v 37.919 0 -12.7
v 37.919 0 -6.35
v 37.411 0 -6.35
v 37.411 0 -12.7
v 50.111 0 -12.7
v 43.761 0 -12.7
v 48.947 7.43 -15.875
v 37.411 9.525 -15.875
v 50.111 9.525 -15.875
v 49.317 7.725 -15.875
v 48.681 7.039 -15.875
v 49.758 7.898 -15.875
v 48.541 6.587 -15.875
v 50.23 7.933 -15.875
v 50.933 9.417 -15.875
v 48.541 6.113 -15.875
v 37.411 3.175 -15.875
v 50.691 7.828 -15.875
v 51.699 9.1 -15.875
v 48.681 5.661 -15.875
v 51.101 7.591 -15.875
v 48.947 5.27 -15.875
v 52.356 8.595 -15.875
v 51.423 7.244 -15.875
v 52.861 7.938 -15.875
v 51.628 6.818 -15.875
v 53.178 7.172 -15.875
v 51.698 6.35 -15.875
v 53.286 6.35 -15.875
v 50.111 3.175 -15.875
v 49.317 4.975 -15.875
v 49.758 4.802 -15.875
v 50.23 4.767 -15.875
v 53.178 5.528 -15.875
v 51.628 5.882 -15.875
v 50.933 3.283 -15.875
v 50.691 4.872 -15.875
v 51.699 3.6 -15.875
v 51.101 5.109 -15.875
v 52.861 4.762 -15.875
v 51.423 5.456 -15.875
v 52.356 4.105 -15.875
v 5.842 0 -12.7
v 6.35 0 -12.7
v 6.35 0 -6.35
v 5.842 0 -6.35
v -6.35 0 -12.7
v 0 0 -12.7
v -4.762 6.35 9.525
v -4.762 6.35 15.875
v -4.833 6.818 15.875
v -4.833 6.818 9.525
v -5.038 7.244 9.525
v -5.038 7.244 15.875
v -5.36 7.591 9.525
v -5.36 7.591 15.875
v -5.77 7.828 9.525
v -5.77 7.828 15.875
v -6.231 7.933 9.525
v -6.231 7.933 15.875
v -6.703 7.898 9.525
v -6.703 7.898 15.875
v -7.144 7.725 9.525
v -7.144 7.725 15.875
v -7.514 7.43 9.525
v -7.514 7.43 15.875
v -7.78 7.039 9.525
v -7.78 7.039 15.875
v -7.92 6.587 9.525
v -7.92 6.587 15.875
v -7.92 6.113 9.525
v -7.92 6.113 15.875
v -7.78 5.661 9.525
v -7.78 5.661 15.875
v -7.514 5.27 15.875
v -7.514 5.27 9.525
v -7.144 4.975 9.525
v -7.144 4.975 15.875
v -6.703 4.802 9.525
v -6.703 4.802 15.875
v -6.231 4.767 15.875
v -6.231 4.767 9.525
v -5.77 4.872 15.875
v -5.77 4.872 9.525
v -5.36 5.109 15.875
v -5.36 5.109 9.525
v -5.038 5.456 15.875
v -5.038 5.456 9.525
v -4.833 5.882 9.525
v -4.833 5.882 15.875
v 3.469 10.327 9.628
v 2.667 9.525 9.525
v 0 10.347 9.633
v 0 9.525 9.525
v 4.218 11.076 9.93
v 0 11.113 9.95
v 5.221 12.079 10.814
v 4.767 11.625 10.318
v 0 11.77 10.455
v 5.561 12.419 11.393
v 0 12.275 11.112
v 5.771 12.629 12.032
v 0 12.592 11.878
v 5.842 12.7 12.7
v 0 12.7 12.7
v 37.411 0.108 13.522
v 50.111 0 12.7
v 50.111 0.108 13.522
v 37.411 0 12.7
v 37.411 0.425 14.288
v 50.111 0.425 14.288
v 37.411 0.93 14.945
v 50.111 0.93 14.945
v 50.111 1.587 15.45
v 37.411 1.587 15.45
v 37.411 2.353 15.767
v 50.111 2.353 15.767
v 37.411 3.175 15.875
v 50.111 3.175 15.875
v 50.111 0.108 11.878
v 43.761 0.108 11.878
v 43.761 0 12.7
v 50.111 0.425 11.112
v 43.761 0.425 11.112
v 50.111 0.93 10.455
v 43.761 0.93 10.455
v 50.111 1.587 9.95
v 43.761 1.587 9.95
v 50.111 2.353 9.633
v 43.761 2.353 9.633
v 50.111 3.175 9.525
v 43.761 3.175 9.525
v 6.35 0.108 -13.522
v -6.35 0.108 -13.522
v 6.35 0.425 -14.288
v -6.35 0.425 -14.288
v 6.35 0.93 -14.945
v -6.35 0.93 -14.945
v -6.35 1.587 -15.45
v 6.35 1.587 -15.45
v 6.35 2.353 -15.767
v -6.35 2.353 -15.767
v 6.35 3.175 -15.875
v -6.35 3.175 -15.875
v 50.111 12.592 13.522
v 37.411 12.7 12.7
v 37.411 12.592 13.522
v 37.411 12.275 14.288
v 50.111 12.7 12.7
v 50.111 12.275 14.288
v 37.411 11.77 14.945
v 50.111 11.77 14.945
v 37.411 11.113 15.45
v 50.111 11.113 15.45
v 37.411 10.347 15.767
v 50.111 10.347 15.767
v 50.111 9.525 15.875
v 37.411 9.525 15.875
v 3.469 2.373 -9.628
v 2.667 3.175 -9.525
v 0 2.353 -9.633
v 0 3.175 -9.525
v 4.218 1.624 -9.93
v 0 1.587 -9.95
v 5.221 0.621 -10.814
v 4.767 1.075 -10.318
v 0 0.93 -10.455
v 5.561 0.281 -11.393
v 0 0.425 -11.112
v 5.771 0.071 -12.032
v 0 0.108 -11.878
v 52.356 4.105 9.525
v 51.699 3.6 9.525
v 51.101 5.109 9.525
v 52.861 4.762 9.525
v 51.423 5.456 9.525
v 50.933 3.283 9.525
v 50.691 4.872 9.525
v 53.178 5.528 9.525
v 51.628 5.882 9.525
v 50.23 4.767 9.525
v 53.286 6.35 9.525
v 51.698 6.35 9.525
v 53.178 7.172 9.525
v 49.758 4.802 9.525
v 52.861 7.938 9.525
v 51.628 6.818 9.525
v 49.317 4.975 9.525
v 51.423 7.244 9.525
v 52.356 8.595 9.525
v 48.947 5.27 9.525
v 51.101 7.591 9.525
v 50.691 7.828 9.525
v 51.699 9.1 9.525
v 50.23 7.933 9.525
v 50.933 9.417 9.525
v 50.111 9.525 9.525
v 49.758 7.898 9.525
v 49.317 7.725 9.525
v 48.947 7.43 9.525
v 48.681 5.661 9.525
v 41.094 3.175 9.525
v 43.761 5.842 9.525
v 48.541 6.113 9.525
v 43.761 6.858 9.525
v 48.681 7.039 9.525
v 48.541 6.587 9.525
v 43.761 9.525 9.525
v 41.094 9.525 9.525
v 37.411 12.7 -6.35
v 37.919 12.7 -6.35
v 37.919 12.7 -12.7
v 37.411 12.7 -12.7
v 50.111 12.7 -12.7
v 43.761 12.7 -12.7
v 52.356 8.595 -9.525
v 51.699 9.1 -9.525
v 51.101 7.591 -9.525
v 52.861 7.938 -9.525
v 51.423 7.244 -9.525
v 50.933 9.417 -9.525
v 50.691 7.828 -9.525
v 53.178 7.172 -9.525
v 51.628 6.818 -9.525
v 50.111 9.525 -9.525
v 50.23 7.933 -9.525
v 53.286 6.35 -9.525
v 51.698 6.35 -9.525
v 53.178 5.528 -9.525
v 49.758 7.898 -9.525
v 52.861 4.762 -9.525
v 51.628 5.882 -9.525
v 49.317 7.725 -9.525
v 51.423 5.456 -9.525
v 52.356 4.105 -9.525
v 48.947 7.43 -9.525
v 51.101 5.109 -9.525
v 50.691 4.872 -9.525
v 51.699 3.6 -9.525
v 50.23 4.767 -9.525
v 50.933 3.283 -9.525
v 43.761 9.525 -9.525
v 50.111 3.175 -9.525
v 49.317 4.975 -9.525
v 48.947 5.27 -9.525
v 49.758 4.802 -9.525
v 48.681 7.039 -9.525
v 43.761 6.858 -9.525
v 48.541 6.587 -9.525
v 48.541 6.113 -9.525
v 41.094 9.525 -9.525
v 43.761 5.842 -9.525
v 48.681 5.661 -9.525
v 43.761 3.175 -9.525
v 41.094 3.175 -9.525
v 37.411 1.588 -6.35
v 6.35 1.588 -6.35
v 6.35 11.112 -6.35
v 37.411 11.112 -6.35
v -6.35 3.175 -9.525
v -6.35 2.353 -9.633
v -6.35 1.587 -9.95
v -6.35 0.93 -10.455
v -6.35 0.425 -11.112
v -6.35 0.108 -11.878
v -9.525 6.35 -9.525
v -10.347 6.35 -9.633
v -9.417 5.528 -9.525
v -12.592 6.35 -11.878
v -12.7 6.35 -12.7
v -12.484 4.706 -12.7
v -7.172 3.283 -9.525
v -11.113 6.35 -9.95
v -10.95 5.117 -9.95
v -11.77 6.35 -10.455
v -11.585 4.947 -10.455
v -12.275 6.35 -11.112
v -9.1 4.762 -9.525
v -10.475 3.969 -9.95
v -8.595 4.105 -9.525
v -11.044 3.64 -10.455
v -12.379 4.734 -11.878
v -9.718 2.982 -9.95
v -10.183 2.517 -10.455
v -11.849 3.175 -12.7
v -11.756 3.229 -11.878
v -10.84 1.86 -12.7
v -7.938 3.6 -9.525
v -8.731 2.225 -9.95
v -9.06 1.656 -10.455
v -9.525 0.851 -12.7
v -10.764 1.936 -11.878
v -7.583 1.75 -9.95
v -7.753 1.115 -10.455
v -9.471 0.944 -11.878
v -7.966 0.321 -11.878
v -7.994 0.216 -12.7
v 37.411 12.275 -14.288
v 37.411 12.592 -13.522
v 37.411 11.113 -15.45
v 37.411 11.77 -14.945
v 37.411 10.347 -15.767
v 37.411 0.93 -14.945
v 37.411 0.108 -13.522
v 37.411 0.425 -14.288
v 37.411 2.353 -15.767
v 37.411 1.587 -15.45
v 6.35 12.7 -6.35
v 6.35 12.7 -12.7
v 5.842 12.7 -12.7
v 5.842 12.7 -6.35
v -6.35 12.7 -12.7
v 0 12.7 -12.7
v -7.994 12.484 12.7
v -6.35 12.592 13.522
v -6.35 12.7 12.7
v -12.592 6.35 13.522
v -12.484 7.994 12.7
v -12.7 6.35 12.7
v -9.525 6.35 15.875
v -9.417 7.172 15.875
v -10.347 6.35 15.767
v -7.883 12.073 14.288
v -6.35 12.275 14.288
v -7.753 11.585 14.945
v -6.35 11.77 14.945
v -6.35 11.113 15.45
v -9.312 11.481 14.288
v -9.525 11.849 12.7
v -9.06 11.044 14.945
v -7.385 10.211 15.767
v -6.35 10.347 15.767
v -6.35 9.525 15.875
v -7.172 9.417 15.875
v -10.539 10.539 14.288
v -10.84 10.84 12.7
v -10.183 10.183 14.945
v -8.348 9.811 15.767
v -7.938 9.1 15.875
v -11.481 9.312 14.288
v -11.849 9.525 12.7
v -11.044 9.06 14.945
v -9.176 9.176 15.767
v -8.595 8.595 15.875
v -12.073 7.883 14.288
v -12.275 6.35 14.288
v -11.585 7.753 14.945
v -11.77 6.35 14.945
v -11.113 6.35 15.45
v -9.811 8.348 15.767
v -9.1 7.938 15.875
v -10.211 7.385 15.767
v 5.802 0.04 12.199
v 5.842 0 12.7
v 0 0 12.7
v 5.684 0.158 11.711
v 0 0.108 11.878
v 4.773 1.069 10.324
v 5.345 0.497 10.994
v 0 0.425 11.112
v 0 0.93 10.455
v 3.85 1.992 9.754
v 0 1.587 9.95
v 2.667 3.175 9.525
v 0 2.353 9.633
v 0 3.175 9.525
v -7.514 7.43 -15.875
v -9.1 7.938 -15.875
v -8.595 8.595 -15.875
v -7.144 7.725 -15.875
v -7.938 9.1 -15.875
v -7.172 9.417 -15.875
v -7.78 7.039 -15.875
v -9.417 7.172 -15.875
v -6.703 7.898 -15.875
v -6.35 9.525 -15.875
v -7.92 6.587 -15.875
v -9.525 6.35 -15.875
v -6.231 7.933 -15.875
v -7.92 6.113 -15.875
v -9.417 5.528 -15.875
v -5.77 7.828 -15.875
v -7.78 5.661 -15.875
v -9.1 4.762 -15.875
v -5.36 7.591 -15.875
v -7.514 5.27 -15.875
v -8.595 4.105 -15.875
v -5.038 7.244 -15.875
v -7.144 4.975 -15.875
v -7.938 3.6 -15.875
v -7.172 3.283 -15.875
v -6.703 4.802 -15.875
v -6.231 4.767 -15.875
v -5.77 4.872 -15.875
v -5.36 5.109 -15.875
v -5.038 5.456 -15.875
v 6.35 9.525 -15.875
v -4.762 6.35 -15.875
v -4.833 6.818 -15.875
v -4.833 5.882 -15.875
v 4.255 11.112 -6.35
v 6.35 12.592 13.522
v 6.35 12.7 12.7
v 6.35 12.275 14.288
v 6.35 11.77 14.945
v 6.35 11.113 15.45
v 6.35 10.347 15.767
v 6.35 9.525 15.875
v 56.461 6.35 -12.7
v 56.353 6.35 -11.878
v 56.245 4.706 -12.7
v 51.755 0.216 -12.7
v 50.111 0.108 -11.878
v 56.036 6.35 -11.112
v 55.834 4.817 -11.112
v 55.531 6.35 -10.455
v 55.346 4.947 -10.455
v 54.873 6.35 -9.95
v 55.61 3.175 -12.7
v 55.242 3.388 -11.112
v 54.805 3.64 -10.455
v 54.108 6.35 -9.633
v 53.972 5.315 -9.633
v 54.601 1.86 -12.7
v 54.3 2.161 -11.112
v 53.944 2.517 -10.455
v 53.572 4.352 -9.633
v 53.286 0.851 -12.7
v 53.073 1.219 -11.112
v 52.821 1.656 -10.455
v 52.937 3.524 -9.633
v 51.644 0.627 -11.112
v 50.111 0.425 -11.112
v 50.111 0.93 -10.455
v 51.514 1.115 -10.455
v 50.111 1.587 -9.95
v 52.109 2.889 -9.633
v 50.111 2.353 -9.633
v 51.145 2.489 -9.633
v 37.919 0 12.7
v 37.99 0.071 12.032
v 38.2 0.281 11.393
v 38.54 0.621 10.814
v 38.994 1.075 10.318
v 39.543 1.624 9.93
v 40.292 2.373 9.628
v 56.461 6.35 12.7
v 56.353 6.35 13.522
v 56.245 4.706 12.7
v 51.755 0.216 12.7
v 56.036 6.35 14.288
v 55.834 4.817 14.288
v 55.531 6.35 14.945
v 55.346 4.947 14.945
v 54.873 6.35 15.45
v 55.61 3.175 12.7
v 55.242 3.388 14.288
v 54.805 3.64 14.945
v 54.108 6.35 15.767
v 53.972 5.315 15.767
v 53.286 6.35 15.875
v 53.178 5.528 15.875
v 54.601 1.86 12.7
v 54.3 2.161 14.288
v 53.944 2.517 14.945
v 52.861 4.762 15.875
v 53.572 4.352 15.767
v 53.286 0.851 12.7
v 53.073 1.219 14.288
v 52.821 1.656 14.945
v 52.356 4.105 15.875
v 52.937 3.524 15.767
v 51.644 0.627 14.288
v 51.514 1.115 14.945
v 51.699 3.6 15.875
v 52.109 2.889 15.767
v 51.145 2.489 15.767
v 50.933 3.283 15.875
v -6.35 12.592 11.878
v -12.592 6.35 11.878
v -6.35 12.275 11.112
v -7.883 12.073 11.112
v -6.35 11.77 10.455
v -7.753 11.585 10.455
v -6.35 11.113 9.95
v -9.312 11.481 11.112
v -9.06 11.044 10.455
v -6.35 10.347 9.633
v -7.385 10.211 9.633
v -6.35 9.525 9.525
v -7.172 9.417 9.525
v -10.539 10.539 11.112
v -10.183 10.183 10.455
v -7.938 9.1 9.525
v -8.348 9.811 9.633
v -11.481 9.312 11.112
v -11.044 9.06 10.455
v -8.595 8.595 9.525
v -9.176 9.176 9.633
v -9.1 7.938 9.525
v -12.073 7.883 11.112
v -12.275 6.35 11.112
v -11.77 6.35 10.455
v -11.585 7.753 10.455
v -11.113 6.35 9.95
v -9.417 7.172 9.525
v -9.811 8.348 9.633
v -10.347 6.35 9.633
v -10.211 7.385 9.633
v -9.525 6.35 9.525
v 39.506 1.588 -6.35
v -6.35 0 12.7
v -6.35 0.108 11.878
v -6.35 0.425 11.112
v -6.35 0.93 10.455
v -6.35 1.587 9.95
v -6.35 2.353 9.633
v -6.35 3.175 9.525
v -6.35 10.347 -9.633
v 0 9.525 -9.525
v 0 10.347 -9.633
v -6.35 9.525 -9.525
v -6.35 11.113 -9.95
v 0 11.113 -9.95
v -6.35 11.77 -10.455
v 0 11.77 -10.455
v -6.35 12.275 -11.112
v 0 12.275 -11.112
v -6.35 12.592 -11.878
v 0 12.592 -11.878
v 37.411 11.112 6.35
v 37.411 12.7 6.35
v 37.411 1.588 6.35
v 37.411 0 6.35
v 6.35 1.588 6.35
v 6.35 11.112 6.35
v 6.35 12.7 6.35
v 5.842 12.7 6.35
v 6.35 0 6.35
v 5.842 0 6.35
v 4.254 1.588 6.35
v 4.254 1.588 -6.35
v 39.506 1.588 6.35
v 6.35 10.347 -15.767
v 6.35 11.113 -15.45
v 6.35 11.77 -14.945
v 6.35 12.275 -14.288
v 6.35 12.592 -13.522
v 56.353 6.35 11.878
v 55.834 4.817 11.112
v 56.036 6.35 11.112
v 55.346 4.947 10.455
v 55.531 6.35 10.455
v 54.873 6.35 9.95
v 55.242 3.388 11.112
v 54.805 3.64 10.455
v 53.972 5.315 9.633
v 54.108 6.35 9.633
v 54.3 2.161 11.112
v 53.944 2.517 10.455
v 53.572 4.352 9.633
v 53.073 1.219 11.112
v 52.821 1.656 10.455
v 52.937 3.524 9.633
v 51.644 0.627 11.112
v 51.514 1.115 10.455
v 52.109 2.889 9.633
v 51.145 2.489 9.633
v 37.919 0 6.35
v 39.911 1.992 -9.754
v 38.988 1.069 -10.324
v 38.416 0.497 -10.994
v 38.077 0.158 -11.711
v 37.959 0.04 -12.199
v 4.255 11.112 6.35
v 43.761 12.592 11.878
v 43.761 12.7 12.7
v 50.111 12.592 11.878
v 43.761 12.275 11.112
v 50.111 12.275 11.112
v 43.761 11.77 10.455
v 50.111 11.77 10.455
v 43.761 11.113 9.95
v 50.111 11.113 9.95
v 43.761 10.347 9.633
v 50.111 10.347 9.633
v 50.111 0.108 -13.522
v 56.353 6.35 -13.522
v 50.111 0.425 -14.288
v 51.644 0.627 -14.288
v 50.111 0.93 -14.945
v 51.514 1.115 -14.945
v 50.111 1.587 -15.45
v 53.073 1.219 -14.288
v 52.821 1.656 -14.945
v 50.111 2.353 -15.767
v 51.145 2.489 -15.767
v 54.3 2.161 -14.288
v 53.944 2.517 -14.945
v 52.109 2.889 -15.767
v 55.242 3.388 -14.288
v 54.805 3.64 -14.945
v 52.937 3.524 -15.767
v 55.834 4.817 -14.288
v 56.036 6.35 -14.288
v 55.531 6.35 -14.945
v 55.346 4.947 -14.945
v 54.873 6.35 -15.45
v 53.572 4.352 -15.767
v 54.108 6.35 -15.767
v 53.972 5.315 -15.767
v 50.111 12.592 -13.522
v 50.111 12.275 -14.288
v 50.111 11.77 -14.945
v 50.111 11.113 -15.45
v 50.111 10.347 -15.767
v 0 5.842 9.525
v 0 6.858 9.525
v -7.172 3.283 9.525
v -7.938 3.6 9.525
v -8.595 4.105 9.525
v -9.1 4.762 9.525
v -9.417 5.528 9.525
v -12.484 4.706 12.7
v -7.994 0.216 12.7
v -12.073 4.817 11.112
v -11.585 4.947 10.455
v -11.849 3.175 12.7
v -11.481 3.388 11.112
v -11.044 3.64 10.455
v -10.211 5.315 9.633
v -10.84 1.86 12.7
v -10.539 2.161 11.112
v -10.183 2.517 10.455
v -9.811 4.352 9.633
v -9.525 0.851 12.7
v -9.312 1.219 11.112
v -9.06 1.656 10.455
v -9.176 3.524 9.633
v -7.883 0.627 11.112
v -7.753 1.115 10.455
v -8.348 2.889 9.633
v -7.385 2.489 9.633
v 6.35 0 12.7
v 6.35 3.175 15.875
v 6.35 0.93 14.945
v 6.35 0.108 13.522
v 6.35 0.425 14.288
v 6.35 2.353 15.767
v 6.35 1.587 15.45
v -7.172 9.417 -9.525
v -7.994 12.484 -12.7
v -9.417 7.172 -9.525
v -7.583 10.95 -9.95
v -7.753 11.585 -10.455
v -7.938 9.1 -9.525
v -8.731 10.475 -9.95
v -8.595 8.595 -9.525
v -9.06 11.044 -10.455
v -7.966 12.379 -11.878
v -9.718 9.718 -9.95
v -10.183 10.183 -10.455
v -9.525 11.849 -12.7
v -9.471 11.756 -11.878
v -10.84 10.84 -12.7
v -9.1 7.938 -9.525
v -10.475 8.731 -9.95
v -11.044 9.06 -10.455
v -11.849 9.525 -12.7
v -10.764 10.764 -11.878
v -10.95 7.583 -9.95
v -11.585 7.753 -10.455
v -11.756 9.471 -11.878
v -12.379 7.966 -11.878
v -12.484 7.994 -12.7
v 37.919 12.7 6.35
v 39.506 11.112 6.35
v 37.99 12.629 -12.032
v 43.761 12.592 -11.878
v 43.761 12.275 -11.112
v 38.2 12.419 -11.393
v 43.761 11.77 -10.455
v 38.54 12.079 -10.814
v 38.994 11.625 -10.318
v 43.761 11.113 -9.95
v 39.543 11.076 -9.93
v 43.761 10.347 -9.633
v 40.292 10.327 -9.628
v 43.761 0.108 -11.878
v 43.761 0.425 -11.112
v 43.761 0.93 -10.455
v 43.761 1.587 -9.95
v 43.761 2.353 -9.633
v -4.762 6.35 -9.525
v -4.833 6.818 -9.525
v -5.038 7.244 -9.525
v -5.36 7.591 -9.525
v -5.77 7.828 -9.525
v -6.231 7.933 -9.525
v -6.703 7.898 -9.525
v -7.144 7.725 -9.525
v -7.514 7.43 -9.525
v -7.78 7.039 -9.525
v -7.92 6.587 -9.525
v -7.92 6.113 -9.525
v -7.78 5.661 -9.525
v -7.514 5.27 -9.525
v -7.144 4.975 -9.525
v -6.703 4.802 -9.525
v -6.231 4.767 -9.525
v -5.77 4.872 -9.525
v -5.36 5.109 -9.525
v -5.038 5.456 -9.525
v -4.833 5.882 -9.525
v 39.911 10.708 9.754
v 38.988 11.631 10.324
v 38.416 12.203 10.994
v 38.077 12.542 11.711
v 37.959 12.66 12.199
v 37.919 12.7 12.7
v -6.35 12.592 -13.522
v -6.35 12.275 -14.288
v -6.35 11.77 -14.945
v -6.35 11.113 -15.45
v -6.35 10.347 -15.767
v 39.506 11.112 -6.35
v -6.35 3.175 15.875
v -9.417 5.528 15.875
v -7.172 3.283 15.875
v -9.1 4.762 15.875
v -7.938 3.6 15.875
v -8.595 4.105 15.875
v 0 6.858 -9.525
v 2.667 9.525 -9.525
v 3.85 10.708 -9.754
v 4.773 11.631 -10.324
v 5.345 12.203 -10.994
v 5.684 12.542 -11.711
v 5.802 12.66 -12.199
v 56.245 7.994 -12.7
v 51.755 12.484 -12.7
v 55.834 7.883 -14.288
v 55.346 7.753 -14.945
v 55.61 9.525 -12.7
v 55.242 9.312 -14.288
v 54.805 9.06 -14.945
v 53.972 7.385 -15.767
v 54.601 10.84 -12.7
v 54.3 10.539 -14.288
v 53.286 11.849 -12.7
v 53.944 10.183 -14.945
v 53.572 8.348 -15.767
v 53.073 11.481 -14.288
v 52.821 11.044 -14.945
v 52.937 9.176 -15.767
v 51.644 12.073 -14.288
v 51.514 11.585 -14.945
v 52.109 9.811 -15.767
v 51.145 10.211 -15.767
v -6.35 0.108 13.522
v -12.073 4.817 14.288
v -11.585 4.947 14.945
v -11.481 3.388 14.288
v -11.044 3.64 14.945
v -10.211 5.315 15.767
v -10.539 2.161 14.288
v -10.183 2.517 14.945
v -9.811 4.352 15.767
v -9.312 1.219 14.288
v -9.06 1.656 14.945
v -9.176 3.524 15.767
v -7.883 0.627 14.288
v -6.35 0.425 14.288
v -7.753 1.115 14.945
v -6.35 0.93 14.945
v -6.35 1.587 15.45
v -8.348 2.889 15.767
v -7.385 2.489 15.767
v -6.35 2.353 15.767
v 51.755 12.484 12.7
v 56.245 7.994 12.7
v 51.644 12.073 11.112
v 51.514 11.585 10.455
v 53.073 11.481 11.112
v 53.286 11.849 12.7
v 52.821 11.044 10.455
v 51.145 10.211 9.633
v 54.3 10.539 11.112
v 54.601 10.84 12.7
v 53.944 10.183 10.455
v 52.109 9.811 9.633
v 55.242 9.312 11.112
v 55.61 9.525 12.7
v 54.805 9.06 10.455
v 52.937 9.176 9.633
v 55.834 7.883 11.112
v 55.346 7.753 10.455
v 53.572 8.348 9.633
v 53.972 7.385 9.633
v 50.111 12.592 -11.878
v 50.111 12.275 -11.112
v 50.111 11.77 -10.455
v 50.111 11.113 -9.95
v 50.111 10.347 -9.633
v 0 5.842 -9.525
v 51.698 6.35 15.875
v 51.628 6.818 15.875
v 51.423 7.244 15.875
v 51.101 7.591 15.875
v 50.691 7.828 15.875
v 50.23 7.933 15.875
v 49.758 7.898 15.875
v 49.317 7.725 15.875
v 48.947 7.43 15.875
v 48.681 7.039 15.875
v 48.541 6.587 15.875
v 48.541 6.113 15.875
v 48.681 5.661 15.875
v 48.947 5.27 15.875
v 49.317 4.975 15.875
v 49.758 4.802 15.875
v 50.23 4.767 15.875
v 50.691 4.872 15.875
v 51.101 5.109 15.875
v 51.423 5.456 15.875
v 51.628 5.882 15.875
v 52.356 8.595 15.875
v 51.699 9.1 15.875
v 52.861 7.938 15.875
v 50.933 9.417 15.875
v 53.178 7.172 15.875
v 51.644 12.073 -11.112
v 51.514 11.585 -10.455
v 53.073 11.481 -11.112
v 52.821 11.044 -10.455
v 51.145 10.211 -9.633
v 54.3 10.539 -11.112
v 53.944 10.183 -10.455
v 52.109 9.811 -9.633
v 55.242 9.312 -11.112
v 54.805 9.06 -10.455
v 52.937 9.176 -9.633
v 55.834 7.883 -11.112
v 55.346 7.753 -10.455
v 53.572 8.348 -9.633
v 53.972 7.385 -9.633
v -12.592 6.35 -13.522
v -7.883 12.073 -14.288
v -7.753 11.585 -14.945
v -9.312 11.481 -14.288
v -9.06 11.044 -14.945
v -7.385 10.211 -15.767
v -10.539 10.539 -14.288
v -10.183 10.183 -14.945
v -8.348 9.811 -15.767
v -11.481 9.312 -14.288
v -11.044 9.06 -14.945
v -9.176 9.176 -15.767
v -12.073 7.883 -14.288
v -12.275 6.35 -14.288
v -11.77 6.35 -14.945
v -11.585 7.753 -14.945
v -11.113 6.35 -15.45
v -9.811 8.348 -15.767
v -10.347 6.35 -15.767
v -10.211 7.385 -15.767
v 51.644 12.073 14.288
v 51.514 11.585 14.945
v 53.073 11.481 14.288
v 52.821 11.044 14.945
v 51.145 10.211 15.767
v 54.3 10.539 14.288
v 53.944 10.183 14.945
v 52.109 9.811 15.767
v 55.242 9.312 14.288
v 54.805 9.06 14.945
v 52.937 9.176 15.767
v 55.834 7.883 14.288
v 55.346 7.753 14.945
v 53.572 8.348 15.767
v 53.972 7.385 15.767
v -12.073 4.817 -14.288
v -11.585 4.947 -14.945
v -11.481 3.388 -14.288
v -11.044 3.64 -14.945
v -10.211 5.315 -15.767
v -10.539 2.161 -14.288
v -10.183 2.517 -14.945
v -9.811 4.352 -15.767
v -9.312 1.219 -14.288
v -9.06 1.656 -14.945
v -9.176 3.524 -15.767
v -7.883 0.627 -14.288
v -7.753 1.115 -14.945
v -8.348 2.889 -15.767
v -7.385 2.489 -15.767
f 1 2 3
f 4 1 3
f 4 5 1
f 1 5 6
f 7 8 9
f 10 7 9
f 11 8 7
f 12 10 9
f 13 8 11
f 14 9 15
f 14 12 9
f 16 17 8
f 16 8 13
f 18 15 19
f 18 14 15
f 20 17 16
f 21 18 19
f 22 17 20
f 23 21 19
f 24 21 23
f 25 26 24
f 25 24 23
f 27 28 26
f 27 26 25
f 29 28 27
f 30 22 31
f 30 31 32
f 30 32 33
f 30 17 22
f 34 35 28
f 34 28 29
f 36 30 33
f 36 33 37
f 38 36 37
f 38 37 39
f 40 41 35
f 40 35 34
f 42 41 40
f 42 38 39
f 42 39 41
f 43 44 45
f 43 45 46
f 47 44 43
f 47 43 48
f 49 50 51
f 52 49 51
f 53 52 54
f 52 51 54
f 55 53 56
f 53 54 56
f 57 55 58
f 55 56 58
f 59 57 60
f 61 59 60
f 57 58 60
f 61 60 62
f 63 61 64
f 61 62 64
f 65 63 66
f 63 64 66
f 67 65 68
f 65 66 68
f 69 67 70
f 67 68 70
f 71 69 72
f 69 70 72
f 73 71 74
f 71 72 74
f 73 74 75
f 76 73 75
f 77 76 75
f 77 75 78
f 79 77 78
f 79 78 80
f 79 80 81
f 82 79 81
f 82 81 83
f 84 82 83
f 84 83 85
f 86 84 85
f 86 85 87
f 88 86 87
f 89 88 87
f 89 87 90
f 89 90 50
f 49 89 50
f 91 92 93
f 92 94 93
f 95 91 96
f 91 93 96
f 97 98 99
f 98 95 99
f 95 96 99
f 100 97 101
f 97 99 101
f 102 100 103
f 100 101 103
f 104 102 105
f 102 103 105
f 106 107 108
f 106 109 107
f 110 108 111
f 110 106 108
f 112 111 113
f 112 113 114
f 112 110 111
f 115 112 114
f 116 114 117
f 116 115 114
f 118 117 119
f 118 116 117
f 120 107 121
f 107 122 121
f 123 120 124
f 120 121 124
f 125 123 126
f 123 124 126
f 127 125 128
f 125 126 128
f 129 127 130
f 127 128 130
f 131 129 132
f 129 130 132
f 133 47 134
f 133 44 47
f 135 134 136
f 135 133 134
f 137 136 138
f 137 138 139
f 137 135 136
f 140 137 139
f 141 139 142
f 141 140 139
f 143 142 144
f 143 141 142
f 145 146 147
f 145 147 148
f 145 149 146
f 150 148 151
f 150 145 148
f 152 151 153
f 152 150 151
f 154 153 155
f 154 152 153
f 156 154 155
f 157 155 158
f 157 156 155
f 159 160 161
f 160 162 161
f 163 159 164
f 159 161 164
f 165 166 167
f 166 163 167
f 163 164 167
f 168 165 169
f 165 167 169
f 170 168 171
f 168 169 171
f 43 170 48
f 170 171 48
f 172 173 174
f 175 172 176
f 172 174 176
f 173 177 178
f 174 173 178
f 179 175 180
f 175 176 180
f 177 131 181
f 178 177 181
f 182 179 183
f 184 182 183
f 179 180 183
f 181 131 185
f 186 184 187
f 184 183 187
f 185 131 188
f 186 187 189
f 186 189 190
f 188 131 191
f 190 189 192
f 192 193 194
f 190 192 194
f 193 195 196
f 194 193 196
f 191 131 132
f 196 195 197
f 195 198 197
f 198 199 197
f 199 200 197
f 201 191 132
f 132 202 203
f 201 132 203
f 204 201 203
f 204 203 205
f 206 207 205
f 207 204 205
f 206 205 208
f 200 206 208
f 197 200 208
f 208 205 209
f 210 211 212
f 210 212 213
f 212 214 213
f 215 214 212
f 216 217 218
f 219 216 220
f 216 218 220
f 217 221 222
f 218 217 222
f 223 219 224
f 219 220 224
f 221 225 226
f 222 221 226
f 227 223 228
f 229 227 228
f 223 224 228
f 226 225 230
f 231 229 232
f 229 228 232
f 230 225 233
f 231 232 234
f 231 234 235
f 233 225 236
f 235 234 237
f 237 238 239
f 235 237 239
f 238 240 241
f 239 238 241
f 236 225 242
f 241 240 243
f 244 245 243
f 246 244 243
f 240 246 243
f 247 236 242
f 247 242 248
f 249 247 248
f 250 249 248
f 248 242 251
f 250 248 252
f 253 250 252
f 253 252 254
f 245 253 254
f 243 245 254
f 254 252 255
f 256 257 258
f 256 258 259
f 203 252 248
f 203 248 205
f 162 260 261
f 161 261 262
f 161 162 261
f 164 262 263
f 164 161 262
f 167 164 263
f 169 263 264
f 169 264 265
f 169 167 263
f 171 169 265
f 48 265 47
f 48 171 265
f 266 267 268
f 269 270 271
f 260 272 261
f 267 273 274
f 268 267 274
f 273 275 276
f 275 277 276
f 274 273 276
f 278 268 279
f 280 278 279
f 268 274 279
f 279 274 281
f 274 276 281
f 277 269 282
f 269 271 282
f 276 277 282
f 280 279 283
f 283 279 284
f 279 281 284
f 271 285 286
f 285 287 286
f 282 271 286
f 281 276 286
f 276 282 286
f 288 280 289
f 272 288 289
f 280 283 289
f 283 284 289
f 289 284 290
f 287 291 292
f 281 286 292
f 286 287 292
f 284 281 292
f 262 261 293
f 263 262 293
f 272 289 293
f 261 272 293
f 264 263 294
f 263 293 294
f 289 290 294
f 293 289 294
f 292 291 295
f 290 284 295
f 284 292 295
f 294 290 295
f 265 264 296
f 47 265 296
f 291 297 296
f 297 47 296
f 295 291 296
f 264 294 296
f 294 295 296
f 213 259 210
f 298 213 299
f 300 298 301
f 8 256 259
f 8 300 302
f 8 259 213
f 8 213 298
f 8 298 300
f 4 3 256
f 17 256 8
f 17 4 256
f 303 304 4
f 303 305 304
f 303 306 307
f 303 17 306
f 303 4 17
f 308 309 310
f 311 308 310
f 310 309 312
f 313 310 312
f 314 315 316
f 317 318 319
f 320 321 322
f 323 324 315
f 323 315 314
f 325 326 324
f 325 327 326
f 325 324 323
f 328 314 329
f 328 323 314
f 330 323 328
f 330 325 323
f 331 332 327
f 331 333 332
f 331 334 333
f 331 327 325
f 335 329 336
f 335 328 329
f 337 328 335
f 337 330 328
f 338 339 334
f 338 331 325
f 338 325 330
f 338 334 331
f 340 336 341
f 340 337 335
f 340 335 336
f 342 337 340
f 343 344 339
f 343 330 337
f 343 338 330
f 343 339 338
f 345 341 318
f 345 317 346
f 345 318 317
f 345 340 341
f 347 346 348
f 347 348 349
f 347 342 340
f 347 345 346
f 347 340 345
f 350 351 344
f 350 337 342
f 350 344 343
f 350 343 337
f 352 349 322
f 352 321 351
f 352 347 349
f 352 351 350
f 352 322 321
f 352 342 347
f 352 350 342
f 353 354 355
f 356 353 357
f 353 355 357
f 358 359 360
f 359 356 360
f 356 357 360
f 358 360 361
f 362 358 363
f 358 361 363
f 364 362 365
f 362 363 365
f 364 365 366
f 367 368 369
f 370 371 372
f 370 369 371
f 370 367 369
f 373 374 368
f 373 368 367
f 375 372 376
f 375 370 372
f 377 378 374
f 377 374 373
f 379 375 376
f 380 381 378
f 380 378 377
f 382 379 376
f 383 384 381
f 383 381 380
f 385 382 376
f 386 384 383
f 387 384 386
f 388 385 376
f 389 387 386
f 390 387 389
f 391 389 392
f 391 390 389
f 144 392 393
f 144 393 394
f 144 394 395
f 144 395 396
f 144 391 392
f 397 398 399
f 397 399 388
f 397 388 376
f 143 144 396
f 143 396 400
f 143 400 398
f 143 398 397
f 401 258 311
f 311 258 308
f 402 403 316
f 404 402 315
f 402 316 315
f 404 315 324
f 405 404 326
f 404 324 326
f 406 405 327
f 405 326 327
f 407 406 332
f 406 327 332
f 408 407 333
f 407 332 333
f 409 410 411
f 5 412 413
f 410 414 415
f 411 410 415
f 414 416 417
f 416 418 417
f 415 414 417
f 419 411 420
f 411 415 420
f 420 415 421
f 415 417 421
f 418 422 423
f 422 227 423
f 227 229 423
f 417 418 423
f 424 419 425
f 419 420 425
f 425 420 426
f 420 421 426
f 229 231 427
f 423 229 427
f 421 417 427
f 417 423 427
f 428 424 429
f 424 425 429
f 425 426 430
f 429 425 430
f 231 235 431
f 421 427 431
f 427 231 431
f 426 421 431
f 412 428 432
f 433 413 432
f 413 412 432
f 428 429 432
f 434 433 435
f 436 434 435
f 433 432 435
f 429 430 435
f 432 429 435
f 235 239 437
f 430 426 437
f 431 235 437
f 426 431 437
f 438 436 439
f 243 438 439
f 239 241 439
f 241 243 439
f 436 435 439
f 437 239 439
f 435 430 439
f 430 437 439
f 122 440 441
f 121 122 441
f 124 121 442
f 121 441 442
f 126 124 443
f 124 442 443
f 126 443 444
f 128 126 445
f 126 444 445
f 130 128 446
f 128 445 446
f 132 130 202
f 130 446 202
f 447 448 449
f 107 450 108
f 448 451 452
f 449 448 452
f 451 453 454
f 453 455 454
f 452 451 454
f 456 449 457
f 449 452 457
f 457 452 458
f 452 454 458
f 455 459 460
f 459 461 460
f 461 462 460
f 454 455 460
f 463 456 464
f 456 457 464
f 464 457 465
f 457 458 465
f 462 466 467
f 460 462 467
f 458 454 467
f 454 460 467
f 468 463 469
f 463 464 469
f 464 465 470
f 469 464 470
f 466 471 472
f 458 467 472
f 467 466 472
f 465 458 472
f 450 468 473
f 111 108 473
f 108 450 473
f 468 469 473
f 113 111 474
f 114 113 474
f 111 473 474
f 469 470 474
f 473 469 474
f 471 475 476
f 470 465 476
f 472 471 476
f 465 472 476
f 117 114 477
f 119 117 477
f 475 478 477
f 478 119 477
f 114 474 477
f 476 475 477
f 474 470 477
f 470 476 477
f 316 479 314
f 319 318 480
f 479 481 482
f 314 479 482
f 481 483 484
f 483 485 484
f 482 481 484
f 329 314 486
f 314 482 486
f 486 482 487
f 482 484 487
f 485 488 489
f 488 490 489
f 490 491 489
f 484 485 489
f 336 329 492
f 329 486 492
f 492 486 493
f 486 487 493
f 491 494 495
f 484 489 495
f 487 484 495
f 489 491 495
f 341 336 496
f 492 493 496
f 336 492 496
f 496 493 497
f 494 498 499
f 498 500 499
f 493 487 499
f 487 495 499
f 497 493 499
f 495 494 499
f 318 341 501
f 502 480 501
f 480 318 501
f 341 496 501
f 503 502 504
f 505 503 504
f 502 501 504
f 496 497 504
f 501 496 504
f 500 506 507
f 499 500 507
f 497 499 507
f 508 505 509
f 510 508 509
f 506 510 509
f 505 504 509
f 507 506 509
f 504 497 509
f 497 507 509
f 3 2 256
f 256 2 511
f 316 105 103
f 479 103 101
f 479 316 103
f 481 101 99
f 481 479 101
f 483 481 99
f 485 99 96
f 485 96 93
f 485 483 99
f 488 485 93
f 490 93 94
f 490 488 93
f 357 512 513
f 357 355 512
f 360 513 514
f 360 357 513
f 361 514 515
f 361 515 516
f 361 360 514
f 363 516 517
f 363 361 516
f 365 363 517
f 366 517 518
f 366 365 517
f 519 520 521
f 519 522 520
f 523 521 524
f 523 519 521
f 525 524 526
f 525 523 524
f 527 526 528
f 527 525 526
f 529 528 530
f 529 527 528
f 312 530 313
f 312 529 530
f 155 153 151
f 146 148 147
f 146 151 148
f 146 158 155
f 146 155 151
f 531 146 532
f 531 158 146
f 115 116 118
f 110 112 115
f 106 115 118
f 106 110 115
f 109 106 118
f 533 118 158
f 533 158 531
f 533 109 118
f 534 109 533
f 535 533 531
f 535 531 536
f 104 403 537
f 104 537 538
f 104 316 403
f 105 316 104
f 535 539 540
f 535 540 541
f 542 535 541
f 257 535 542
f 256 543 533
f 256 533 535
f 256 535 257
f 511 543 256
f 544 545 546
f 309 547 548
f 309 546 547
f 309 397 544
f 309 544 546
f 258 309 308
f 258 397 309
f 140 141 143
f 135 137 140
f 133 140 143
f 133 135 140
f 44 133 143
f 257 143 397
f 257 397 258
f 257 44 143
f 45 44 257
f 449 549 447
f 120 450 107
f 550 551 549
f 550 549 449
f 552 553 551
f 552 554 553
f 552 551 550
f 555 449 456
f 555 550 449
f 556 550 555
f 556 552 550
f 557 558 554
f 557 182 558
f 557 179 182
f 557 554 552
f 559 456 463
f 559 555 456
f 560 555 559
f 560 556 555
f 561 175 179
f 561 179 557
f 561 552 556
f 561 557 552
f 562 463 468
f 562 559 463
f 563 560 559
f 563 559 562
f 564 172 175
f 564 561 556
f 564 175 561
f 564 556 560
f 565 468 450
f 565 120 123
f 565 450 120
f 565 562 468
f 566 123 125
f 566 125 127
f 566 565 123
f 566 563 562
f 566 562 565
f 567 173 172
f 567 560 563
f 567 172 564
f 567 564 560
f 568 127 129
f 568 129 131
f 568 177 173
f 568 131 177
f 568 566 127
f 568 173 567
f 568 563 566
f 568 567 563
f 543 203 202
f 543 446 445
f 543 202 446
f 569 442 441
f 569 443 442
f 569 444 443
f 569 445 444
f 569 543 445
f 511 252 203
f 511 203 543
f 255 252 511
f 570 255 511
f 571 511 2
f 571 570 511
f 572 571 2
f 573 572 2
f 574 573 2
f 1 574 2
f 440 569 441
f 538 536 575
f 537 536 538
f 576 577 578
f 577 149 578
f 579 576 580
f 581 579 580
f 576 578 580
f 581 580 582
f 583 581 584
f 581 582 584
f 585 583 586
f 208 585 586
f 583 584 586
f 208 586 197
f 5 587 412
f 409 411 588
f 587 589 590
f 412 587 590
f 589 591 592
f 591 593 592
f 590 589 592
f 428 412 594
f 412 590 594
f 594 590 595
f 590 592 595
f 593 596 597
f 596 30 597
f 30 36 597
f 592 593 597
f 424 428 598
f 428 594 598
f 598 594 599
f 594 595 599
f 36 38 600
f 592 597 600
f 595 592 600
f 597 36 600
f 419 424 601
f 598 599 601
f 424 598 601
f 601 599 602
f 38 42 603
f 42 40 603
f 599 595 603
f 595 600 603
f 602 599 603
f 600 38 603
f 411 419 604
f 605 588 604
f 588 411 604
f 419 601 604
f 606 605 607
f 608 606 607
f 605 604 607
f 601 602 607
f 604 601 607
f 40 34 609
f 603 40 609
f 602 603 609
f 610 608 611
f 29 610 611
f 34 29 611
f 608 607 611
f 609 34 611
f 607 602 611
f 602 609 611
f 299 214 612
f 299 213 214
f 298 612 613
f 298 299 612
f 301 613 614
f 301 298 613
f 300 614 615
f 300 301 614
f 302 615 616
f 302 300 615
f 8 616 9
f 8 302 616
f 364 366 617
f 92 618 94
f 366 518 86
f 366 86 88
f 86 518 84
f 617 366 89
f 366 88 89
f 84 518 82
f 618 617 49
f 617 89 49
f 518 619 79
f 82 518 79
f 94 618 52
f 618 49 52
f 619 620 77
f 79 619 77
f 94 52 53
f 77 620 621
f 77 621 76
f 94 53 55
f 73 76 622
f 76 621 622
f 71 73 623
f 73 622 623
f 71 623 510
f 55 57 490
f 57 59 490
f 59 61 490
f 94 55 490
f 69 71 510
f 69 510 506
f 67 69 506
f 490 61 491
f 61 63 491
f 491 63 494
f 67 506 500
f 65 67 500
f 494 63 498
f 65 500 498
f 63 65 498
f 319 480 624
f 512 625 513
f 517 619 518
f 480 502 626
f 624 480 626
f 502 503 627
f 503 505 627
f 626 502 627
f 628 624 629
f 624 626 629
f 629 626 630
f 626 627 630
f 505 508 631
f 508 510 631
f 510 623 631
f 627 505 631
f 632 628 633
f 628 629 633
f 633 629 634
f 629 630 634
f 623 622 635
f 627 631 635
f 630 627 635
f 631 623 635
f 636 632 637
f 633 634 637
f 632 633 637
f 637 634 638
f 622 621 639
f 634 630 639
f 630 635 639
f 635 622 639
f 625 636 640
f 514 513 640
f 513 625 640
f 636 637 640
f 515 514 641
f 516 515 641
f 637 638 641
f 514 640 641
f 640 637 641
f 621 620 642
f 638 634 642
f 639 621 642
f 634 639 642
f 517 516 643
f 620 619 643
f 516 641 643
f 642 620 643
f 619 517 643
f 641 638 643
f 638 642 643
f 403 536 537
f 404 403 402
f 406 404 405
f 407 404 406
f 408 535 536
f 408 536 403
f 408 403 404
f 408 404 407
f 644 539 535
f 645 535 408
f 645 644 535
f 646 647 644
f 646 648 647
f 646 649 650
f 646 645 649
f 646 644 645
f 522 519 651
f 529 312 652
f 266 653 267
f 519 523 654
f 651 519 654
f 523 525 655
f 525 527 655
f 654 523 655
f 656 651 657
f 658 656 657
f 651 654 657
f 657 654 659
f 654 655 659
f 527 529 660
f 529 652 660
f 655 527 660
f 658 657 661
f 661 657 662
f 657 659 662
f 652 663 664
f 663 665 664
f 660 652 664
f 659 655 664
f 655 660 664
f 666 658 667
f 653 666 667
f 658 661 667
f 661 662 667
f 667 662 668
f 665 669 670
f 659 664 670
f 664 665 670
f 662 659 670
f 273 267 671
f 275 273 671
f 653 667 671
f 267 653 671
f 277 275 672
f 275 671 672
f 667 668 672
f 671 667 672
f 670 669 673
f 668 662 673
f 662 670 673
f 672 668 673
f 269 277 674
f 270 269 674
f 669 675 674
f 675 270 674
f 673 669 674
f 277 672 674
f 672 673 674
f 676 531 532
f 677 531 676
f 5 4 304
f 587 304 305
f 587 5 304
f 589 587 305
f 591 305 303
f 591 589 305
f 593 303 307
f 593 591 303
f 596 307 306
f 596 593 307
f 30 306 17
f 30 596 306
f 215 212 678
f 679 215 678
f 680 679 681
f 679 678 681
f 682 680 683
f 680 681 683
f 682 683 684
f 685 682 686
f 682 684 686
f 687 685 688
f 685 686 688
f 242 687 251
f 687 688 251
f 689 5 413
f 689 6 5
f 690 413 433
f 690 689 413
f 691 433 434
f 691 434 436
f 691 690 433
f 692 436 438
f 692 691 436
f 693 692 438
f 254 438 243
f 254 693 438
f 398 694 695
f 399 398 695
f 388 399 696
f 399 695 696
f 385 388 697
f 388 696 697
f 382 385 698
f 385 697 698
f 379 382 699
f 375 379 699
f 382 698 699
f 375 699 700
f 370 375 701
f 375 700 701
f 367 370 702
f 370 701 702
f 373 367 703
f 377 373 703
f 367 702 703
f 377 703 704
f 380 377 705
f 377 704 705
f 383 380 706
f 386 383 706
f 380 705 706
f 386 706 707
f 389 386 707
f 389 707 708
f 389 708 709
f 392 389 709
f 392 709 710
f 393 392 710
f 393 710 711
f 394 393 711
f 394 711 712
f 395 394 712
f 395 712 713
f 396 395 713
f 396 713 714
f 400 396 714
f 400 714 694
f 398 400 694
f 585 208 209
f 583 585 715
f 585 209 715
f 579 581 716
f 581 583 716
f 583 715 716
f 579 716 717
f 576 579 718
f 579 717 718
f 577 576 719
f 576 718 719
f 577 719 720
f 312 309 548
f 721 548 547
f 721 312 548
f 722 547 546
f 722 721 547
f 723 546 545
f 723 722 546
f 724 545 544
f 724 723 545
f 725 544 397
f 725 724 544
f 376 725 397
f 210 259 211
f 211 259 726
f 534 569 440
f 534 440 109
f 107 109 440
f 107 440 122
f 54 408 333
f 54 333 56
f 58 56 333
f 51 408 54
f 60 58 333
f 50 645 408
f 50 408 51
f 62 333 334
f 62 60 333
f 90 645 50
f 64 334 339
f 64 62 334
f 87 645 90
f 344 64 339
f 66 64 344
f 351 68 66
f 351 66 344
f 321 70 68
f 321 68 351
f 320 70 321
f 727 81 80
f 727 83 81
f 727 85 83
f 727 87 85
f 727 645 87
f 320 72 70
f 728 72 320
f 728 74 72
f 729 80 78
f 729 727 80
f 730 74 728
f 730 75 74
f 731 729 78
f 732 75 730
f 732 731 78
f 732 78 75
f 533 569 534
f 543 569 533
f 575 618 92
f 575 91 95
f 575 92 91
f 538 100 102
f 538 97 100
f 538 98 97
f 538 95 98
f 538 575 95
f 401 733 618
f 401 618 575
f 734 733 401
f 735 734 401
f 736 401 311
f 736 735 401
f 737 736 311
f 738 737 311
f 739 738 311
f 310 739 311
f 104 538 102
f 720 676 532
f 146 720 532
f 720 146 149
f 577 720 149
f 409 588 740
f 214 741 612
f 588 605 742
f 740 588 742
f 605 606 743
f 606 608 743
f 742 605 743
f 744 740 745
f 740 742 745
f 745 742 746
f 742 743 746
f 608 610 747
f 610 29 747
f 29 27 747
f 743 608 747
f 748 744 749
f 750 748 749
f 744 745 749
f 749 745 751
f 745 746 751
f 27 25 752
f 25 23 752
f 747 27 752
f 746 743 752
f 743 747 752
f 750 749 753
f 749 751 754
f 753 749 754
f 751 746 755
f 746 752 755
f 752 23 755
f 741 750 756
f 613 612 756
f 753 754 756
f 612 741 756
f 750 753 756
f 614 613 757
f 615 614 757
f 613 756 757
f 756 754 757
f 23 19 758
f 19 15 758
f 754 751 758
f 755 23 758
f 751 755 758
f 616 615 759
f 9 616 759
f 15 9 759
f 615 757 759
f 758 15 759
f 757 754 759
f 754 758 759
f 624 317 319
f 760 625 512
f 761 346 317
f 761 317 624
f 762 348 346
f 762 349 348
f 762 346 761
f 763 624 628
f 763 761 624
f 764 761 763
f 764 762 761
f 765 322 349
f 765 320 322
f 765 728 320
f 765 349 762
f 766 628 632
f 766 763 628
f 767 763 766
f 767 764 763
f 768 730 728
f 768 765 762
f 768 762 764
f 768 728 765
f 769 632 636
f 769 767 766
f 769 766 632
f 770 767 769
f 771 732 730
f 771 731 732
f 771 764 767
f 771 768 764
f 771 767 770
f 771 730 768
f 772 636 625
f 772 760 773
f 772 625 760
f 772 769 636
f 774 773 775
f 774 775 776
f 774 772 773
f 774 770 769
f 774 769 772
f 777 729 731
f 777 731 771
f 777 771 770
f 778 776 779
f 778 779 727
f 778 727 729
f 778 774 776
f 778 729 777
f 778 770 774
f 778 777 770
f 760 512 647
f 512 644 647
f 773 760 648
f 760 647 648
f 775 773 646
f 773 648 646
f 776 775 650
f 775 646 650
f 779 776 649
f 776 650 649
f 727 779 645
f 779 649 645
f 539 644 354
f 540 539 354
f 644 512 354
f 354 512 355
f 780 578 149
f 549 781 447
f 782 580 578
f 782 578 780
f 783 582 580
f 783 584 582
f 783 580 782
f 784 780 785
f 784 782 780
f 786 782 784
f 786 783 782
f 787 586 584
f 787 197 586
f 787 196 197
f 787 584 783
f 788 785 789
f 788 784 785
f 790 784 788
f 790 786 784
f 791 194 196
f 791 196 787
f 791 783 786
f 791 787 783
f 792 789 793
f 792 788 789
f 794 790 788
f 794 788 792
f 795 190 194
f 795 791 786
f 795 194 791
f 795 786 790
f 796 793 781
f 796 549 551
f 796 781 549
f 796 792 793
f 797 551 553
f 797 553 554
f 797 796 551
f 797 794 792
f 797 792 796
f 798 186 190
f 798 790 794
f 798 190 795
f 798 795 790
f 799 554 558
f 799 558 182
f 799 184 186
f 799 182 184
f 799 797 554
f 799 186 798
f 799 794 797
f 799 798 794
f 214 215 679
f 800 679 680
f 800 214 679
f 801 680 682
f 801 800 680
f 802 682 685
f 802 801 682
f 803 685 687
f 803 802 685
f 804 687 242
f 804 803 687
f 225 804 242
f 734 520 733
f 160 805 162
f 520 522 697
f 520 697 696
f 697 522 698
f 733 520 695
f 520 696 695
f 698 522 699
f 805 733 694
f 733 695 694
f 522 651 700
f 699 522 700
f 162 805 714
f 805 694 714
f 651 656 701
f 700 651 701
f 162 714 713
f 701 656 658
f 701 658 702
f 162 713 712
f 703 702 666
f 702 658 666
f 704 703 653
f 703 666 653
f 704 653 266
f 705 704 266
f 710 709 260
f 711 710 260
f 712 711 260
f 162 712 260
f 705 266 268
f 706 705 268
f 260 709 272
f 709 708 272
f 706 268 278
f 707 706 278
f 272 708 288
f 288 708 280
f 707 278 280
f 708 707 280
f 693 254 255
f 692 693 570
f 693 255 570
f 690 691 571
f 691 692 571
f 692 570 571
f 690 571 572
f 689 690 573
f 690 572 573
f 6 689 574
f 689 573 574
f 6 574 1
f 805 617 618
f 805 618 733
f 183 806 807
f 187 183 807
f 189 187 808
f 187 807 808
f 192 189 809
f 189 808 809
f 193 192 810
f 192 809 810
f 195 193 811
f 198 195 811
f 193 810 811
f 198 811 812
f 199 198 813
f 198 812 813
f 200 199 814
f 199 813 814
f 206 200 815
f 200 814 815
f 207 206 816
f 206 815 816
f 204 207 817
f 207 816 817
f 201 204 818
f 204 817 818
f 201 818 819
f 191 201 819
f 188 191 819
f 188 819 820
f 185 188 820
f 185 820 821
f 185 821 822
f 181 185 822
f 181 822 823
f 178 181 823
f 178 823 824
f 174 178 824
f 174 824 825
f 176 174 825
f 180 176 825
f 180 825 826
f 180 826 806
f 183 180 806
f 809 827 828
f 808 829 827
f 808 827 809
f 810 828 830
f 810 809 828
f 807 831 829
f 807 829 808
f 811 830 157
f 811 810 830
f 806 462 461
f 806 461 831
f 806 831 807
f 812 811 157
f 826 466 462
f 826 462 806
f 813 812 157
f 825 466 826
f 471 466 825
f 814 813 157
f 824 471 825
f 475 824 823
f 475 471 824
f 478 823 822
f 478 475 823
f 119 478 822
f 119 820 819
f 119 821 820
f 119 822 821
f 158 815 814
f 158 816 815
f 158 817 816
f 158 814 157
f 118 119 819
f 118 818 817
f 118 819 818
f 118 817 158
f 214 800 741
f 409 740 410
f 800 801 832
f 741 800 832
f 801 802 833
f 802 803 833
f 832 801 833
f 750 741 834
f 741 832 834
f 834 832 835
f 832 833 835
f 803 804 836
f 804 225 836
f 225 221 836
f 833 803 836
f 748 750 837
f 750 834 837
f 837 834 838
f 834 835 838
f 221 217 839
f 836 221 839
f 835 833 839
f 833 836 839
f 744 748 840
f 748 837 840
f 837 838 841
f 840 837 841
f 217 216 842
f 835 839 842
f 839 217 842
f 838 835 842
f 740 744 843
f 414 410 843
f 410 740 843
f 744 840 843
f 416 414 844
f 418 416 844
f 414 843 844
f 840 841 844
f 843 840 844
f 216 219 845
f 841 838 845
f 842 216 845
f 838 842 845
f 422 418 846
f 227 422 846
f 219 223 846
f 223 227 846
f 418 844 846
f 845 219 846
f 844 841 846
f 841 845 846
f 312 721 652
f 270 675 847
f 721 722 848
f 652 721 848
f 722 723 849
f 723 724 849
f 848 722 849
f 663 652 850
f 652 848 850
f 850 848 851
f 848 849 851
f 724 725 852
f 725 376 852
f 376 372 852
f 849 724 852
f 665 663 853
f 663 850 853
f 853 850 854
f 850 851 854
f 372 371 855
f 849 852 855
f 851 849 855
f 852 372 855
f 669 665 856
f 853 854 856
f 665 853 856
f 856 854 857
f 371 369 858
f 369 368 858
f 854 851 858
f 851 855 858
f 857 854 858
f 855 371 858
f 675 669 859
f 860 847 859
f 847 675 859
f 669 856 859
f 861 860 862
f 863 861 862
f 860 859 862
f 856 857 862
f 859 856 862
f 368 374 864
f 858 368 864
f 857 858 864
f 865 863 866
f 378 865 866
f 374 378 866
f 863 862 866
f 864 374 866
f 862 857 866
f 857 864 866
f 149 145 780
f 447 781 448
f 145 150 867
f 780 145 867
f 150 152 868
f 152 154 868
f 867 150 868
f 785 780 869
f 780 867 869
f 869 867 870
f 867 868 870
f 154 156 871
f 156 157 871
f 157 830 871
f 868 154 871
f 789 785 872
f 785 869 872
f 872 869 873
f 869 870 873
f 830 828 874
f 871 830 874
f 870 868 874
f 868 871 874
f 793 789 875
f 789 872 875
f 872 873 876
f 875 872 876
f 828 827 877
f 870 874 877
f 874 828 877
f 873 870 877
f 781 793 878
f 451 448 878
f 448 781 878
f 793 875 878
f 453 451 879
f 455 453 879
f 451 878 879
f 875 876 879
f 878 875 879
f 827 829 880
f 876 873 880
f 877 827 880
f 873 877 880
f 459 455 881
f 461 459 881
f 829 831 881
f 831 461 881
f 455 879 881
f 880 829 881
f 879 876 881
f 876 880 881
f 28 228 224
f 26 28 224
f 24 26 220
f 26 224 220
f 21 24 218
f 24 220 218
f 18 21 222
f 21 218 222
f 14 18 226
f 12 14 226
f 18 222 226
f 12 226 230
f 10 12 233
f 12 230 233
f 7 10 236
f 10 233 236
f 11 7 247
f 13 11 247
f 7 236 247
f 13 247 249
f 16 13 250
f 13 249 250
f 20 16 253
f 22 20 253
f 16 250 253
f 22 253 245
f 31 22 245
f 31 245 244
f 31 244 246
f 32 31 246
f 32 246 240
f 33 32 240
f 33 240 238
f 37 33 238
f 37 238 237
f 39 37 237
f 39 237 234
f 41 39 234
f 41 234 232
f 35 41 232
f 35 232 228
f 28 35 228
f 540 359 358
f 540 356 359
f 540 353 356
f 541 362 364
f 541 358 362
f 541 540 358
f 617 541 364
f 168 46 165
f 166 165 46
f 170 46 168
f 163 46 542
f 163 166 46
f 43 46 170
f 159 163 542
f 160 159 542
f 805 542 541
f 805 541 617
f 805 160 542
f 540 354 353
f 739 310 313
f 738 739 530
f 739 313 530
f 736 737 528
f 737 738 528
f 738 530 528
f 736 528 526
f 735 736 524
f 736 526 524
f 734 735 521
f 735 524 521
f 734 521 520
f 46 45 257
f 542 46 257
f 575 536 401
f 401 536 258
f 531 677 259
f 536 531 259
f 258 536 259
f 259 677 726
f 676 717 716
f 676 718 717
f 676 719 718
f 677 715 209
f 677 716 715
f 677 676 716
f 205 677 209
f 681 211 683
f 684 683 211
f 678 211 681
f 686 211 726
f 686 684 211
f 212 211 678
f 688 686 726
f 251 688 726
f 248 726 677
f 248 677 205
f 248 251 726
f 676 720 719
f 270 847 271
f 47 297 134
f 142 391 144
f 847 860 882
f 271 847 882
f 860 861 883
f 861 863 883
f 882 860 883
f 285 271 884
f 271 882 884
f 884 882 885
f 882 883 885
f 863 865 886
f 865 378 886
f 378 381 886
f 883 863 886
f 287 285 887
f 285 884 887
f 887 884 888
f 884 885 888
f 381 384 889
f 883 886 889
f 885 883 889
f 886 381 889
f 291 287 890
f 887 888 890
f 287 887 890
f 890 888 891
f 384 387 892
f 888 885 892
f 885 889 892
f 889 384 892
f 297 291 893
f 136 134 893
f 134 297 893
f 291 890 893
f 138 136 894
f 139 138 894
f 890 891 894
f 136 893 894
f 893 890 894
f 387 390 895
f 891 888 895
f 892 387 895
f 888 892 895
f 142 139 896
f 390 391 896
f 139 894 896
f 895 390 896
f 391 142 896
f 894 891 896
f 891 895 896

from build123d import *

# Parameters (mm, degrees)
BOSS_EXTRUDE1_DEPTH = 12.7
SKETCH2_R           = 1.5875
CUT_EXTRUDE1_DEPTH  = 67.009021317
FILLET5_R           = 6.35
FILLET6_R           = 3.175
CHAMFER1_START      = -12.7
CHAMFER1_DEPTH      = 25.4
CHAMFER1_2_DEPTH    = 5.842
CHAMFER1_START_2    = 37.918945752
CHAMFER1_3_DEPTH    = 5.842
CUT_EXTRUDE2_REACH  = 62.01
SKETCH4_W           = 12.7
SKETCH4_H           = 1.5875


with BuildPart() as part:
    # Sketch1 → Boss-Extrude1 (new body)
    with BuildSketch(Plane(origin=(0, 0, 0), x_dir=(1, 0, 0), z_dir=(0, 1, 0))):
        Polygon((0, 9.525), (-12.7, 9.525), (-12.7, 15.875), (6.35, 15.875), (6.35, 6.35), (37.410945752, 6.35), (37.410945752, 15.875), (56.460945752, 15.875), (56.460945752, 9.525), (43.760945752, 9.525), (43.760945752, -9.525), (56.460945752, -9.525), (56.460945752, -15.875), (37.410945752, -15.875), (37.410945752, -6.35), (6.35, -6.35), (6.35, -15.875), (-12.7, -15.875), (-12.7, -9.525), (0, -9.525), align=None)
    extrude(amount=BOSS_EXTRUDE1_DEPTH)

    # Sketch2 → Cut-Extrude1 (cut, through all)
    with BuildSketch(Plane.XY.offset(15.875)):
        with Locations((50.110945752, 6.35)):
            Circle(SKETCH2_R)
        with Locations((-6.35, 6.35)):
            Circle(SKETCH2_R)
    extrude(amount=-CUT_EXTRUDE1_DEPTH, mode=Mode.SUBTRACT)

    # Fillet5
    fillet5_edges = [part.edges().sort_by_distance(p)[0] for p in [
        (56.460945752, 0, 12.7),
        (56.460945752, 12.7, 12.7),
        (56.460945752, 0, -12.7),
        (56.460945752, 12.7, -12.7),
        (-12.7, 12.7, 12.7),
        (-12.7, 0, 12.7),
        (-12.7, 0, -12.7),
        (-12.7, 12.7, -12.7),
    ]]
    fillet(fillet5_edges, radius=FILLET5_R - 0.0001)  # a hair under: the kernel refuses the full size

    # Fillet6
    fillet6_edges = [part.edges().sort_by_distance(p)[0] for p in [
        (43.760995752, 0, 15.875),
        (54.601103102, 1.85984265, 15.875),
        (54.601103102, 10.84015735, 15.875),
        (43.760995752, 0, -15.875),
        (54.601103102, 1.85984265, -15.875),
        (54.601103102, 10.84015735, -15.875),
        (-5e-05, 0, -15.875),
        (-10.84015735, 1.85984265, -15.875),
        (-10.84015735, 10.84015735, -15.875),
        (-5e-05, 12.7, 15.875),
        (-5e-05, 0, 15.875),
        (-10.84015735, 1.85984265, 15.875),
        (-3.17505, 12.7, -9.525),
        (-3.17505, 0, -9.525),
        (-10.84015735, 1.85984265, -9.525),
        (-3.17505, 0, 9.525),
        (-10.84015735, 1.85984265, 9.525),
        (-3.17505, 12.7, 9.525),
        (46.935995752, 0, -9.525),
        (54.601103102, 1.85984265, -9.525),
        (46.935995752, 12.7, -9.525),
        (46.935995752, 12.7, 9.525),
        (46.935995752, 0, 9.525),
        (54.601103102, 1.85984265, 9.525),
        (43.760995752, 12.7, 15.875),
        (43.760995752, 12.7, -15.875),
        (-5e-05, 12.7, -15.875),
        (-10.84015735, 10.84015735, 15.875),
        (-10.84015735, 10.84015735, -9.525),
        (-10.84015735, 10.84015735, 9.525),
        (54.601103102, 10.84015735, -9.525),
        (54.601103102, 10.84015735, 9.525),
    ]]
    fillet(fillet6_edges, radius=FILLET6_R - 0.0001)  # a hair under: the kernel refuses the full size

    # Chamfer1: read off the stored shape, not the designer's step
    # Chamfer1 outline → Chamfer1 (cut)
    with BuildSketch(Plane.XY.offset(CHAMFER1_START)):
        Polygon((43.760945752, 5.842), (37.918945752, 0), (43.760945752, 0), align=None)
        Polygon((0, 0), (5.842, 0), (0, 5.842), align=None)
        Polygon((37.918945752, 12.7), (43.760945752, 6.858), (43.760945752, 12.7), align=None)
        Polygon((0, 12.7), (0, 6.858), (5.842, 12.7), align=None)
    extrude(amount=CHAMFER1_DEPTH, mode=Mode.SUBTRACT)

    # Chamfer1 2 outline → Chamfer1 2 (add)
    with BuildSketch(Plane.YZ):
        with BuildLine():
            Line((6.858, 9.525), (9.525, 9.525))
            ThreePointArc((9.525, 9.525), (11.77006403, 10.45493597), (12.7, 12.7))
            Line((12.7, 12.7), (6.858, 12.7))
            Line((6.858, 12.7), (6.858, 9.525))
        make_face()
        with BuildLine():
            ThreePointArc((3.175, -9.525), (0.92993597, -10.45493597), (0, -12.7))
            Line((0, -12.7), (5.842, -12.7))
            Line((5.842, -12.7), (5.842, -9.525))
            Line((5.842, -9.525), (3.175, -9.525))
        make_face()
        with BuildLine():
            Line((6.858, -9.525), (6.858, -12.7))
            Line((6.858, -12.7), (12.7, -12.7))
            ThreePointArc((12.7, -12.7), (11.77006403, -10.45493597), (9.525, -9.525))
            Line((9.525, -9.525), (6.858, -9.525))
        make_face()
        with BuildLine():
            ThreePointArc((0, 12.7), (0.92993597, 10.45493597), (3.175, 9.525))
            Line((3.175, 9.525), (5.842, 9.525))
            Line((5.842, 9.525), (5.842, 12.7))
            Line((5.842, 12.7), (0, 12.7))
        make_face()
    extrude(amount=CHAMFER1_2_DEPTH)

    # Chamfer1 3 outline → Chamfer1 3 (add)
    with BuildSketch(Plane.YZ.offset(CHAMFER1_START_2)):
        with BuildLine():
            Line((6.858, 9.525), (9.525, 9.525))
            ThreePointArc((9.525, 9.525), (11.77006403, 10.45493597), (12.7, 12.7))
            Line((12.7, 12.7), (6.858, 12.7))
            Line((6.858, 12.7), (6.858, 9.525))
        make_face()
        with BuildLine():
            ThreePointArc((3.175, -9.525), (0.92993597, -10.45493597), (0, -12.7))
            Line((0, -12.7), (5.842, -12.7))
            Line((5.842, -12.7), (5.842, -9.525))
            Line((5.842, -9.525), (3.175, -9.525))
        make_face()
        with BuildLine():
            Line((6.858, -9.525), (6.858, -12.7))
            Line((6.858, -12.7), (12.7, -12.7))
            ThreePointArc((12.7, -12.7), (11.77006403, -10.45493597), (9.525, -9.525))
            Line((9.525, -9.525), (6.858, -9.525))
        make_face()
        with BuildLine():
            ThreePointArc((0, 12.7), (0.92993597, 10.45493597), (3.175, 9.525))
            Line((3.175, 9.525), (5.842, 9.525))
            Line((5.842, 9.525), (5.842, 12.7))
            Line((5.842, 12.7), (0, 12.7))
        make_face()
    extrude(amount=CHAMFER1_3_DEPTH)

    # Cut-Extrude2: up to this plane
    cut_extrude2_end = Plane(origin=(5.842, 12.7, 0), z_dir=(0.7071067811865497, -0.7071067811865455, 0))
    # Sketch4 → Cut-Extrude2 (cut, up to the surface)
    with BuildSketch(Plane(origin=(43.760945752, 0, 0), x_dir=(0, 0, -1), z_dir=(1, 0, 0)), mode=Mode.PRIVATE) as cut_extrude2_sk1:
        with Locations((0, 11.90625)):
            Rectangle(SKETCH4_W, SKETCH4_H)
    cut_extrude2_tool1 = split(extrude(cut_extrude2_sk1.sketch, amount=-CUT_EXTRUDE2_REACH, mode=Mode.PRIVATE), bisect_by=cut_extrude2_end, keep=Keep.BOTH, mode=Mode.PRIVATE)
    add(cut_extrude2_tool1.solids().sort_by_distance((43.760946, 11.90625, 0))[0], mode=Mode.SUBTRACT)
    # Sketch4 → Cut-Extrude2 (cut, up to the surface)
    with BuildSketch(Plane(origin=(43.760945752, 0, 0), x_dir=(0, 0, -1), z_dir=(1, 0, 0)), mode=Mode.PRIVATE) as cut_extrude2_sk2:
        with Locations((0, 0.79375)):
            Rectangle(SKETCH4_W, SKETCH4_H)
    cut_extrude2_tool2 = split(extrude(cut_extrude2_sk2.sketch, amount=-CUT_EXTRUDE2_REACH, mode=Mode.PRIVATE), bisect_by=cut_extrude2_end, keep=Keep.BOTH, mode=Mode.PRIVATE)
    add(cut_extrude2_tool2.solids().sort_by_distance((43.760946, 0.79375, 0))[0], mode=Mode.SUBTRACT)


solid = part.part
